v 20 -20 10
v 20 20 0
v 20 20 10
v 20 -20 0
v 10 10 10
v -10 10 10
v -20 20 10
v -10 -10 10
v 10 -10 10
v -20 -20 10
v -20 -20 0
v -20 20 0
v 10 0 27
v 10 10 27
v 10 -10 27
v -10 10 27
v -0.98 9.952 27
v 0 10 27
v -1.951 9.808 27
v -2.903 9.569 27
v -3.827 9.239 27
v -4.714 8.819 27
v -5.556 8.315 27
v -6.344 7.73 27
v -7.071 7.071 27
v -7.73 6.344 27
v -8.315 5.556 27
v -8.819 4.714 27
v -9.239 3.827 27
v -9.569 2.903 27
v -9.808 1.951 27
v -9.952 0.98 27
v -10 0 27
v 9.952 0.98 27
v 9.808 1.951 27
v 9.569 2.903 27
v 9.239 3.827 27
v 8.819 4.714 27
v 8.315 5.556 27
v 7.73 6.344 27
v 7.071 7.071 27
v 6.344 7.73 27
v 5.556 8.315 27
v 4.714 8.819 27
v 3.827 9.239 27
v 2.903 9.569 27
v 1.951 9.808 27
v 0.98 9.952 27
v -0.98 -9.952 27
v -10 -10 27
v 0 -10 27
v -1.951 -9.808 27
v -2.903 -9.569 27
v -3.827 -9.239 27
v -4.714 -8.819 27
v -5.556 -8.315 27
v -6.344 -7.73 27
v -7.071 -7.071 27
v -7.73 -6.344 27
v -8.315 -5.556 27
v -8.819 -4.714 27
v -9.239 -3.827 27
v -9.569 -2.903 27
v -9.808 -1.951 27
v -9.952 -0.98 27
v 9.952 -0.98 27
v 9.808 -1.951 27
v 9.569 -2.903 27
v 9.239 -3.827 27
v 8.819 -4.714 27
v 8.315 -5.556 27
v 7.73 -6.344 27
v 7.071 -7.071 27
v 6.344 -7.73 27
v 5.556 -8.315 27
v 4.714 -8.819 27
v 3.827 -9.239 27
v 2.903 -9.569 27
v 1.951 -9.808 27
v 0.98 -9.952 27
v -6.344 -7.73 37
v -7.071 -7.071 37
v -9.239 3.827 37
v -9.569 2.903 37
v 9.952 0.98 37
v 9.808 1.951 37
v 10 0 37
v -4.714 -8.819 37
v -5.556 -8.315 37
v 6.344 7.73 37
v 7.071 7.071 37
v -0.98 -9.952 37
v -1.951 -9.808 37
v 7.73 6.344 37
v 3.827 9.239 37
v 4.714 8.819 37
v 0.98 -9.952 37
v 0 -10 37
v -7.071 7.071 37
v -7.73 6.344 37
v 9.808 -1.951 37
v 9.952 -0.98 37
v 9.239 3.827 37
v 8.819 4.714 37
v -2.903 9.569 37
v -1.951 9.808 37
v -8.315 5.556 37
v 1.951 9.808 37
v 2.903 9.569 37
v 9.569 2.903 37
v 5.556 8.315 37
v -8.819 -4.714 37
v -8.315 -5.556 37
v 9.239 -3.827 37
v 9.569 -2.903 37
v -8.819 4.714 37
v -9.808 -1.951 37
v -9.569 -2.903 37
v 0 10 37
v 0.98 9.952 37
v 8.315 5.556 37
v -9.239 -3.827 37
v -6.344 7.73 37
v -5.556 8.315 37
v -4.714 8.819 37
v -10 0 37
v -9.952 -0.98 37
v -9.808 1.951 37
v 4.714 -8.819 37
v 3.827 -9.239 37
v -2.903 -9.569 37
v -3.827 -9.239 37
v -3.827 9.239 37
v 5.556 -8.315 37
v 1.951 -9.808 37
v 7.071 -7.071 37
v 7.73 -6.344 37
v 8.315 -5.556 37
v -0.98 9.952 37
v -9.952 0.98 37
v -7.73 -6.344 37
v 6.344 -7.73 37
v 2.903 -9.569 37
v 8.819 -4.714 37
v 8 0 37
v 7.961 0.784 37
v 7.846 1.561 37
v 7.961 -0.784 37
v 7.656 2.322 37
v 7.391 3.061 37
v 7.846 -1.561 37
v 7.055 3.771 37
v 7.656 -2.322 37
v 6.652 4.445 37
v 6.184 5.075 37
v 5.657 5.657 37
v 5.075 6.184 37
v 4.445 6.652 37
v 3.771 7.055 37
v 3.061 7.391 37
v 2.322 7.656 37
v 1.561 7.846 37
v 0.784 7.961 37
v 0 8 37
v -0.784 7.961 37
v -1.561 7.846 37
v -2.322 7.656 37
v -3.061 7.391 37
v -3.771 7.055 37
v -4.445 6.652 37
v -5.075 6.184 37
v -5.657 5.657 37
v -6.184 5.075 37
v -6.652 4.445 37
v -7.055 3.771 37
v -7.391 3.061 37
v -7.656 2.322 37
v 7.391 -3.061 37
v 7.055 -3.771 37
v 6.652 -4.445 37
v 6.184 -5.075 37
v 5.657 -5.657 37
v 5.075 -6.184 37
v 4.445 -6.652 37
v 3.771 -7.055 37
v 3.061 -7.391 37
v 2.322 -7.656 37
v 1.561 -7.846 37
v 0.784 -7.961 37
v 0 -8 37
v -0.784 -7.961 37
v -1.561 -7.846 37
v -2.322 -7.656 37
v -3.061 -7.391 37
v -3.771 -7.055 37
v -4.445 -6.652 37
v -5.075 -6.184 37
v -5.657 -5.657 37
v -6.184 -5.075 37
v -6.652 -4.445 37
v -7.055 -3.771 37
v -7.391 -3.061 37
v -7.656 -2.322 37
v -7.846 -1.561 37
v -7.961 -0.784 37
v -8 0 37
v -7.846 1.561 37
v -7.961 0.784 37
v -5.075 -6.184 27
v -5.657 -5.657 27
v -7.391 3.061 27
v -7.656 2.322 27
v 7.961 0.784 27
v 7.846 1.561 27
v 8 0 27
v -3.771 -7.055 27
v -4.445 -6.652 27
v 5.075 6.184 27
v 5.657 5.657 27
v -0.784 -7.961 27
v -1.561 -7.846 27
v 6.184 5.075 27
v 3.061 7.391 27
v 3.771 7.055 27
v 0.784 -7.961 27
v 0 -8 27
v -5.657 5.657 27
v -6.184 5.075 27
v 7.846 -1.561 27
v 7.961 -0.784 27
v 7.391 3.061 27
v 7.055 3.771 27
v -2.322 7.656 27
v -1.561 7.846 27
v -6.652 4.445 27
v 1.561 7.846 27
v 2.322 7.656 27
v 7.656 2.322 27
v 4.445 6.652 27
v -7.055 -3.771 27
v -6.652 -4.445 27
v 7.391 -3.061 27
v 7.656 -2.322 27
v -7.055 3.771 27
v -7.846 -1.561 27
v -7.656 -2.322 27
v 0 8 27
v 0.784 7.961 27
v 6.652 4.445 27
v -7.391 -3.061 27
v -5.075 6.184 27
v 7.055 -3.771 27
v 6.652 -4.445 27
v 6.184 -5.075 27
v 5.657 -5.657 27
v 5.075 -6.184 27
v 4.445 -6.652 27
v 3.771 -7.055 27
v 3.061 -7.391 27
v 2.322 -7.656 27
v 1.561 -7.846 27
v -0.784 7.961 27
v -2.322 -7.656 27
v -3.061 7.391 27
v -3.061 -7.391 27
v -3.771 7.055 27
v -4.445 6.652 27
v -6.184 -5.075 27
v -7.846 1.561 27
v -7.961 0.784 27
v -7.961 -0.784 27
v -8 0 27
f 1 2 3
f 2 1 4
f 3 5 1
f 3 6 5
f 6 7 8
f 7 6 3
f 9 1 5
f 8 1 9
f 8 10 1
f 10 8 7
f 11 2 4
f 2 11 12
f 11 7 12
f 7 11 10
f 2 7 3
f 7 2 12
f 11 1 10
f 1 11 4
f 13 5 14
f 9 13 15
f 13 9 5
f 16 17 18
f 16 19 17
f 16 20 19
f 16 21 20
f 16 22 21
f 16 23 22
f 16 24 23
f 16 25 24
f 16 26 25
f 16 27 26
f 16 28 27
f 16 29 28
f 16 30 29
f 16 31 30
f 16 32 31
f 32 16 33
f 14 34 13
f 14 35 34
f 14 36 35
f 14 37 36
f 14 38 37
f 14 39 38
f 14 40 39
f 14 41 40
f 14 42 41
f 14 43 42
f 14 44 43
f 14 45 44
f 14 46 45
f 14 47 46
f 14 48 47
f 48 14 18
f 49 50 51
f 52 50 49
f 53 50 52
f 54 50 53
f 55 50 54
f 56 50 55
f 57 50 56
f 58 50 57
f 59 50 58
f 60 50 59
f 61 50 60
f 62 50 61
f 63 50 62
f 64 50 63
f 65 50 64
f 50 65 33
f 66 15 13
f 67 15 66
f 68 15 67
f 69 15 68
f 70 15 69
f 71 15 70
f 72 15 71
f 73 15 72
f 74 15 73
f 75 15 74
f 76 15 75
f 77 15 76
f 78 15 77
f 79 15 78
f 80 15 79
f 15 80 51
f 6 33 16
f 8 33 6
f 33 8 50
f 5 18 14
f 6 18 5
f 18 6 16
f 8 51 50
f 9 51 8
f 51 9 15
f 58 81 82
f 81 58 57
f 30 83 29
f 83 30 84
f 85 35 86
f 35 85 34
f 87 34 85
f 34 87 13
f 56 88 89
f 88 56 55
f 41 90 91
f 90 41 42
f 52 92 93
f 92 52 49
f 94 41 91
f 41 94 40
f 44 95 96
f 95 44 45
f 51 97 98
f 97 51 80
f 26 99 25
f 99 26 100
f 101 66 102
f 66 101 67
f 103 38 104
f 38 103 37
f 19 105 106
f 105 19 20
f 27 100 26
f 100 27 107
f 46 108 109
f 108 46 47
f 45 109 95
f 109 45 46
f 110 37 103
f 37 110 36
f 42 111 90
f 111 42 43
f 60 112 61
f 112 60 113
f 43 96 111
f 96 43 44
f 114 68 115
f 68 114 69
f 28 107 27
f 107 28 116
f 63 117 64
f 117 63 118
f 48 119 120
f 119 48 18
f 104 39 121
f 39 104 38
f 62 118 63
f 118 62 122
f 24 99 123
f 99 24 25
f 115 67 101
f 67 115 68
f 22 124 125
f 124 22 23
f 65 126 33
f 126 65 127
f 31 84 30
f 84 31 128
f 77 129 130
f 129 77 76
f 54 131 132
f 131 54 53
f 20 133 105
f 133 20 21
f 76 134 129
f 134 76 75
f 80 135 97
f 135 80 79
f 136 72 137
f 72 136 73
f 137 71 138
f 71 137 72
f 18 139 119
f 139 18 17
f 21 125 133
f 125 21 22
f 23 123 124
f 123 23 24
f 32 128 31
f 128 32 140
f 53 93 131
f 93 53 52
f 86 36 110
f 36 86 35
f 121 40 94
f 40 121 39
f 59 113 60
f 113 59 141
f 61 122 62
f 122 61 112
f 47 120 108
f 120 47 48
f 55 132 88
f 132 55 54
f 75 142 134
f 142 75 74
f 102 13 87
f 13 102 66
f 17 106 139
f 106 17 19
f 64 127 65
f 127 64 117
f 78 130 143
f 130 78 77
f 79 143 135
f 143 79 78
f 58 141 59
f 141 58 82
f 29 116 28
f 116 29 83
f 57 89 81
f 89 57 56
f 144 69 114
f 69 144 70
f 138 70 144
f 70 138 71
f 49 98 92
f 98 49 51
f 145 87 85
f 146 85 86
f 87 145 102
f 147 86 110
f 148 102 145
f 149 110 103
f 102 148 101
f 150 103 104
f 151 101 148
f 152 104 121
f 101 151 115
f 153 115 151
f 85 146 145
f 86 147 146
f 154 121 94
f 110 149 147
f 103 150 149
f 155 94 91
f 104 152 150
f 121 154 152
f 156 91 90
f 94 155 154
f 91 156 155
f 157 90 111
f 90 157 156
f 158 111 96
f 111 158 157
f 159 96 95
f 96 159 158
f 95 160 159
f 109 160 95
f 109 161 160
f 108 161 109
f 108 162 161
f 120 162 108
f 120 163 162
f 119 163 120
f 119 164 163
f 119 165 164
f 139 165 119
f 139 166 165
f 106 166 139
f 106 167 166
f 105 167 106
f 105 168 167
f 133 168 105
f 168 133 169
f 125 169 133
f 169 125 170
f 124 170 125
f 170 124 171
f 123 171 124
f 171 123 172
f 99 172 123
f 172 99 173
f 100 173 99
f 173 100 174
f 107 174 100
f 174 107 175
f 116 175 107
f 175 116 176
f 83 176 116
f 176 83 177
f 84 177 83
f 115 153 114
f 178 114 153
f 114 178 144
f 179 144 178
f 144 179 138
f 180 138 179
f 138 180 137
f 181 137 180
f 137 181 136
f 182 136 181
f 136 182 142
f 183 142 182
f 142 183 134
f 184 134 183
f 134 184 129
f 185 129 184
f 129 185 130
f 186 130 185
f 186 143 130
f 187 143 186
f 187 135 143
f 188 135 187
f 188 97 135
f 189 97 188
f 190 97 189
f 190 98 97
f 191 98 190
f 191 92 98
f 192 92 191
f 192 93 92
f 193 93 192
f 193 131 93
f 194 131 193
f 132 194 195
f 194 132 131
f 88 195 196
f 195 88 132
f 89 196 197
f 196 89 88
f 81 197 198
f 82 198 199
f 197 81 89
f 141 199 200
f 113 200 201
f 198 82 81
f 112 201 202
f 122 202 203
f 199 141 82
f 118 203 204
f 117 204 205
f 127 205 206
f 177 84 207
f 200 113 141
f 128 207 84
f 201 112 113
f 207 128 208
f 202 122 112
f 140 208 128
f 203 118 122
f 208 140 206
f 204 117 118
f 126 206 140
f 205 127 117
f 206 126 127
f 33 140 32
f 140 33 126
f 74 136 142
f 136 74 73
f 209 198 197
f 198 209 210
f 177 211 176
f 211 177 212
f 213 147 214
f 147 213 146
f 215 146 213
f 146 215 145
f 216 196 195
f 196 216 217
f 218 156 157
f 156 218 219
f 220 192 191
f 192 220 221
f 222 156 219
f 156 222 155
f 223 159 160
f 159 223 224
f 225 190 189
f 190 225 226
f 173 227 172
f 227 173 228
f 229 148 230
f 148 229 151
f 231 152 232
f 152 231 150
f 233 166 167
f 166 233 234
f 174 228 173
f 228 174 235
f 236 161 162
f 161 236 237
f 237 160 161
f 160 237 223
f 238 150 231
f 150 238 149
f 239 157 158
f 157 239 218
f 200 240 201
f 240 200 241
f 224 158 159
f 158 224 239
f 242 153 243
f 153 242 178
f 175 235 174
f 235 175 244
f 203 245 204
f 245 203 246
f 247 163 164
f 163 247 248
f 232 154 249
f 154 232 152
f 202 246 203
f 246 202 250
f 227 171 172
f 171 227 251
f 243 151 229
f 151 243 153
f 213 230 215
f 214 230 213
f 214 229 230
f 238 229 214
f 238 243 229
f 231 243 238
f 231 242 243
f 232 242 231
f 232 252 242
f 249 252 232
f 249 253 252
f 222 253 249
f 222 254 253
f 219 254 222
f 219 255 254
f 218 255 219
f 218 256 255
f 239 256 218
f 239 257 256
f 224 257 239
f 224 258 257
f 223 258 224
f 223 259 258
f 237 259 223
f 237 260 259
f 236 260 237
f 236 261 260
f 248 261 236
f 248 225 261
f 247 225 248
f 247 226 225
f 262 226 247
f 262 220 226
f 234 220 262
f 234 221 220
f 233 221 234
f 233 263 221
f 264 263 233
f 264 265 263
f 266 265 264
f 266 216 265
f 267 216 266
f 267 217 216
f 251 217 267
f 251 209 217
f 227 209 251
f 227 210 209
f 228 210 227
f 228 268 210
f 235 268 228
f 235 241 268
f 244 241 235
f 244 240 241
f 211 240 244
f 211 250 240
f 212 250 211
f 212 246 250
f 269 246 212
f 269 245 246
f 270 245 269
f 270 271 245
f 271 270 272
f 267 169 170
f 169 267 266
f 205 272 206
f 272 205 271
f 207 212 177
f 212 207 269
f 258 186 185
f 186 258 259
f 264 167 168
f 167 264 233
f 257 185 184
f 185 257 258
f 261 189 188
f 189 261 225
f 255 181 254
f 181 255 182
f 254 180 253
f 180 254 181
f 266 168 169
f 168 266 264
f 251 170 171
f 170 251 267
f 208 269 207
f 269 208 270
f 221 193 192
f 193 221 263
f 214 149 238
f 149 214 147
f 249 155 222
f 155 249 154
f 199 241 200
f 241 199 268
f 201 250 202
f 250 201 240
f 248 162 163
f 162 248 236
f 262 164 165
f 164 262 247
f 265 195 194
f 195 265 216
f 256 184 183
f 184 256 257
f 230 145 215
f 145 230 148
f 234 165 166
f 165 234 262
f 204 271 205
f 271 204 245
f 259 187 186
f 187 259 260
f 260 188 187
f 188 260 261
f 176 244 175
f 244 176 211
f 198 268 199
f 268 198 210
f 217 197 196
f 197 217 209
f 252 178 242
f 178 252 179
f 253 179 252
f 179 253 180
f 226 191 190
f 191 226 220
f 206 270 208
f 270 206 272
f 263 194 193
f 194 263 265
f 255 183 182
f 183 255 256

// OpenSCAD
module shaft_support_bracket() {
    difference() {
        union() {
            // Base block
            translate([-20, -20, 0])
                cube([40, 40, 10]);
            
            // Vertical support
            translate([-10, -10, 10])
                cube([20, 20, 17]);
            
            // Cylinder for rod
            translate([0, 0, 27])
                cylinder(h=10, d=20, $fn=64);
        }
        
        // Hole for the rod
        translate([0, 0, 27])
            cylinder(h=20, d=16, $fn=64);
    }
}

shaft_support_bracket();
